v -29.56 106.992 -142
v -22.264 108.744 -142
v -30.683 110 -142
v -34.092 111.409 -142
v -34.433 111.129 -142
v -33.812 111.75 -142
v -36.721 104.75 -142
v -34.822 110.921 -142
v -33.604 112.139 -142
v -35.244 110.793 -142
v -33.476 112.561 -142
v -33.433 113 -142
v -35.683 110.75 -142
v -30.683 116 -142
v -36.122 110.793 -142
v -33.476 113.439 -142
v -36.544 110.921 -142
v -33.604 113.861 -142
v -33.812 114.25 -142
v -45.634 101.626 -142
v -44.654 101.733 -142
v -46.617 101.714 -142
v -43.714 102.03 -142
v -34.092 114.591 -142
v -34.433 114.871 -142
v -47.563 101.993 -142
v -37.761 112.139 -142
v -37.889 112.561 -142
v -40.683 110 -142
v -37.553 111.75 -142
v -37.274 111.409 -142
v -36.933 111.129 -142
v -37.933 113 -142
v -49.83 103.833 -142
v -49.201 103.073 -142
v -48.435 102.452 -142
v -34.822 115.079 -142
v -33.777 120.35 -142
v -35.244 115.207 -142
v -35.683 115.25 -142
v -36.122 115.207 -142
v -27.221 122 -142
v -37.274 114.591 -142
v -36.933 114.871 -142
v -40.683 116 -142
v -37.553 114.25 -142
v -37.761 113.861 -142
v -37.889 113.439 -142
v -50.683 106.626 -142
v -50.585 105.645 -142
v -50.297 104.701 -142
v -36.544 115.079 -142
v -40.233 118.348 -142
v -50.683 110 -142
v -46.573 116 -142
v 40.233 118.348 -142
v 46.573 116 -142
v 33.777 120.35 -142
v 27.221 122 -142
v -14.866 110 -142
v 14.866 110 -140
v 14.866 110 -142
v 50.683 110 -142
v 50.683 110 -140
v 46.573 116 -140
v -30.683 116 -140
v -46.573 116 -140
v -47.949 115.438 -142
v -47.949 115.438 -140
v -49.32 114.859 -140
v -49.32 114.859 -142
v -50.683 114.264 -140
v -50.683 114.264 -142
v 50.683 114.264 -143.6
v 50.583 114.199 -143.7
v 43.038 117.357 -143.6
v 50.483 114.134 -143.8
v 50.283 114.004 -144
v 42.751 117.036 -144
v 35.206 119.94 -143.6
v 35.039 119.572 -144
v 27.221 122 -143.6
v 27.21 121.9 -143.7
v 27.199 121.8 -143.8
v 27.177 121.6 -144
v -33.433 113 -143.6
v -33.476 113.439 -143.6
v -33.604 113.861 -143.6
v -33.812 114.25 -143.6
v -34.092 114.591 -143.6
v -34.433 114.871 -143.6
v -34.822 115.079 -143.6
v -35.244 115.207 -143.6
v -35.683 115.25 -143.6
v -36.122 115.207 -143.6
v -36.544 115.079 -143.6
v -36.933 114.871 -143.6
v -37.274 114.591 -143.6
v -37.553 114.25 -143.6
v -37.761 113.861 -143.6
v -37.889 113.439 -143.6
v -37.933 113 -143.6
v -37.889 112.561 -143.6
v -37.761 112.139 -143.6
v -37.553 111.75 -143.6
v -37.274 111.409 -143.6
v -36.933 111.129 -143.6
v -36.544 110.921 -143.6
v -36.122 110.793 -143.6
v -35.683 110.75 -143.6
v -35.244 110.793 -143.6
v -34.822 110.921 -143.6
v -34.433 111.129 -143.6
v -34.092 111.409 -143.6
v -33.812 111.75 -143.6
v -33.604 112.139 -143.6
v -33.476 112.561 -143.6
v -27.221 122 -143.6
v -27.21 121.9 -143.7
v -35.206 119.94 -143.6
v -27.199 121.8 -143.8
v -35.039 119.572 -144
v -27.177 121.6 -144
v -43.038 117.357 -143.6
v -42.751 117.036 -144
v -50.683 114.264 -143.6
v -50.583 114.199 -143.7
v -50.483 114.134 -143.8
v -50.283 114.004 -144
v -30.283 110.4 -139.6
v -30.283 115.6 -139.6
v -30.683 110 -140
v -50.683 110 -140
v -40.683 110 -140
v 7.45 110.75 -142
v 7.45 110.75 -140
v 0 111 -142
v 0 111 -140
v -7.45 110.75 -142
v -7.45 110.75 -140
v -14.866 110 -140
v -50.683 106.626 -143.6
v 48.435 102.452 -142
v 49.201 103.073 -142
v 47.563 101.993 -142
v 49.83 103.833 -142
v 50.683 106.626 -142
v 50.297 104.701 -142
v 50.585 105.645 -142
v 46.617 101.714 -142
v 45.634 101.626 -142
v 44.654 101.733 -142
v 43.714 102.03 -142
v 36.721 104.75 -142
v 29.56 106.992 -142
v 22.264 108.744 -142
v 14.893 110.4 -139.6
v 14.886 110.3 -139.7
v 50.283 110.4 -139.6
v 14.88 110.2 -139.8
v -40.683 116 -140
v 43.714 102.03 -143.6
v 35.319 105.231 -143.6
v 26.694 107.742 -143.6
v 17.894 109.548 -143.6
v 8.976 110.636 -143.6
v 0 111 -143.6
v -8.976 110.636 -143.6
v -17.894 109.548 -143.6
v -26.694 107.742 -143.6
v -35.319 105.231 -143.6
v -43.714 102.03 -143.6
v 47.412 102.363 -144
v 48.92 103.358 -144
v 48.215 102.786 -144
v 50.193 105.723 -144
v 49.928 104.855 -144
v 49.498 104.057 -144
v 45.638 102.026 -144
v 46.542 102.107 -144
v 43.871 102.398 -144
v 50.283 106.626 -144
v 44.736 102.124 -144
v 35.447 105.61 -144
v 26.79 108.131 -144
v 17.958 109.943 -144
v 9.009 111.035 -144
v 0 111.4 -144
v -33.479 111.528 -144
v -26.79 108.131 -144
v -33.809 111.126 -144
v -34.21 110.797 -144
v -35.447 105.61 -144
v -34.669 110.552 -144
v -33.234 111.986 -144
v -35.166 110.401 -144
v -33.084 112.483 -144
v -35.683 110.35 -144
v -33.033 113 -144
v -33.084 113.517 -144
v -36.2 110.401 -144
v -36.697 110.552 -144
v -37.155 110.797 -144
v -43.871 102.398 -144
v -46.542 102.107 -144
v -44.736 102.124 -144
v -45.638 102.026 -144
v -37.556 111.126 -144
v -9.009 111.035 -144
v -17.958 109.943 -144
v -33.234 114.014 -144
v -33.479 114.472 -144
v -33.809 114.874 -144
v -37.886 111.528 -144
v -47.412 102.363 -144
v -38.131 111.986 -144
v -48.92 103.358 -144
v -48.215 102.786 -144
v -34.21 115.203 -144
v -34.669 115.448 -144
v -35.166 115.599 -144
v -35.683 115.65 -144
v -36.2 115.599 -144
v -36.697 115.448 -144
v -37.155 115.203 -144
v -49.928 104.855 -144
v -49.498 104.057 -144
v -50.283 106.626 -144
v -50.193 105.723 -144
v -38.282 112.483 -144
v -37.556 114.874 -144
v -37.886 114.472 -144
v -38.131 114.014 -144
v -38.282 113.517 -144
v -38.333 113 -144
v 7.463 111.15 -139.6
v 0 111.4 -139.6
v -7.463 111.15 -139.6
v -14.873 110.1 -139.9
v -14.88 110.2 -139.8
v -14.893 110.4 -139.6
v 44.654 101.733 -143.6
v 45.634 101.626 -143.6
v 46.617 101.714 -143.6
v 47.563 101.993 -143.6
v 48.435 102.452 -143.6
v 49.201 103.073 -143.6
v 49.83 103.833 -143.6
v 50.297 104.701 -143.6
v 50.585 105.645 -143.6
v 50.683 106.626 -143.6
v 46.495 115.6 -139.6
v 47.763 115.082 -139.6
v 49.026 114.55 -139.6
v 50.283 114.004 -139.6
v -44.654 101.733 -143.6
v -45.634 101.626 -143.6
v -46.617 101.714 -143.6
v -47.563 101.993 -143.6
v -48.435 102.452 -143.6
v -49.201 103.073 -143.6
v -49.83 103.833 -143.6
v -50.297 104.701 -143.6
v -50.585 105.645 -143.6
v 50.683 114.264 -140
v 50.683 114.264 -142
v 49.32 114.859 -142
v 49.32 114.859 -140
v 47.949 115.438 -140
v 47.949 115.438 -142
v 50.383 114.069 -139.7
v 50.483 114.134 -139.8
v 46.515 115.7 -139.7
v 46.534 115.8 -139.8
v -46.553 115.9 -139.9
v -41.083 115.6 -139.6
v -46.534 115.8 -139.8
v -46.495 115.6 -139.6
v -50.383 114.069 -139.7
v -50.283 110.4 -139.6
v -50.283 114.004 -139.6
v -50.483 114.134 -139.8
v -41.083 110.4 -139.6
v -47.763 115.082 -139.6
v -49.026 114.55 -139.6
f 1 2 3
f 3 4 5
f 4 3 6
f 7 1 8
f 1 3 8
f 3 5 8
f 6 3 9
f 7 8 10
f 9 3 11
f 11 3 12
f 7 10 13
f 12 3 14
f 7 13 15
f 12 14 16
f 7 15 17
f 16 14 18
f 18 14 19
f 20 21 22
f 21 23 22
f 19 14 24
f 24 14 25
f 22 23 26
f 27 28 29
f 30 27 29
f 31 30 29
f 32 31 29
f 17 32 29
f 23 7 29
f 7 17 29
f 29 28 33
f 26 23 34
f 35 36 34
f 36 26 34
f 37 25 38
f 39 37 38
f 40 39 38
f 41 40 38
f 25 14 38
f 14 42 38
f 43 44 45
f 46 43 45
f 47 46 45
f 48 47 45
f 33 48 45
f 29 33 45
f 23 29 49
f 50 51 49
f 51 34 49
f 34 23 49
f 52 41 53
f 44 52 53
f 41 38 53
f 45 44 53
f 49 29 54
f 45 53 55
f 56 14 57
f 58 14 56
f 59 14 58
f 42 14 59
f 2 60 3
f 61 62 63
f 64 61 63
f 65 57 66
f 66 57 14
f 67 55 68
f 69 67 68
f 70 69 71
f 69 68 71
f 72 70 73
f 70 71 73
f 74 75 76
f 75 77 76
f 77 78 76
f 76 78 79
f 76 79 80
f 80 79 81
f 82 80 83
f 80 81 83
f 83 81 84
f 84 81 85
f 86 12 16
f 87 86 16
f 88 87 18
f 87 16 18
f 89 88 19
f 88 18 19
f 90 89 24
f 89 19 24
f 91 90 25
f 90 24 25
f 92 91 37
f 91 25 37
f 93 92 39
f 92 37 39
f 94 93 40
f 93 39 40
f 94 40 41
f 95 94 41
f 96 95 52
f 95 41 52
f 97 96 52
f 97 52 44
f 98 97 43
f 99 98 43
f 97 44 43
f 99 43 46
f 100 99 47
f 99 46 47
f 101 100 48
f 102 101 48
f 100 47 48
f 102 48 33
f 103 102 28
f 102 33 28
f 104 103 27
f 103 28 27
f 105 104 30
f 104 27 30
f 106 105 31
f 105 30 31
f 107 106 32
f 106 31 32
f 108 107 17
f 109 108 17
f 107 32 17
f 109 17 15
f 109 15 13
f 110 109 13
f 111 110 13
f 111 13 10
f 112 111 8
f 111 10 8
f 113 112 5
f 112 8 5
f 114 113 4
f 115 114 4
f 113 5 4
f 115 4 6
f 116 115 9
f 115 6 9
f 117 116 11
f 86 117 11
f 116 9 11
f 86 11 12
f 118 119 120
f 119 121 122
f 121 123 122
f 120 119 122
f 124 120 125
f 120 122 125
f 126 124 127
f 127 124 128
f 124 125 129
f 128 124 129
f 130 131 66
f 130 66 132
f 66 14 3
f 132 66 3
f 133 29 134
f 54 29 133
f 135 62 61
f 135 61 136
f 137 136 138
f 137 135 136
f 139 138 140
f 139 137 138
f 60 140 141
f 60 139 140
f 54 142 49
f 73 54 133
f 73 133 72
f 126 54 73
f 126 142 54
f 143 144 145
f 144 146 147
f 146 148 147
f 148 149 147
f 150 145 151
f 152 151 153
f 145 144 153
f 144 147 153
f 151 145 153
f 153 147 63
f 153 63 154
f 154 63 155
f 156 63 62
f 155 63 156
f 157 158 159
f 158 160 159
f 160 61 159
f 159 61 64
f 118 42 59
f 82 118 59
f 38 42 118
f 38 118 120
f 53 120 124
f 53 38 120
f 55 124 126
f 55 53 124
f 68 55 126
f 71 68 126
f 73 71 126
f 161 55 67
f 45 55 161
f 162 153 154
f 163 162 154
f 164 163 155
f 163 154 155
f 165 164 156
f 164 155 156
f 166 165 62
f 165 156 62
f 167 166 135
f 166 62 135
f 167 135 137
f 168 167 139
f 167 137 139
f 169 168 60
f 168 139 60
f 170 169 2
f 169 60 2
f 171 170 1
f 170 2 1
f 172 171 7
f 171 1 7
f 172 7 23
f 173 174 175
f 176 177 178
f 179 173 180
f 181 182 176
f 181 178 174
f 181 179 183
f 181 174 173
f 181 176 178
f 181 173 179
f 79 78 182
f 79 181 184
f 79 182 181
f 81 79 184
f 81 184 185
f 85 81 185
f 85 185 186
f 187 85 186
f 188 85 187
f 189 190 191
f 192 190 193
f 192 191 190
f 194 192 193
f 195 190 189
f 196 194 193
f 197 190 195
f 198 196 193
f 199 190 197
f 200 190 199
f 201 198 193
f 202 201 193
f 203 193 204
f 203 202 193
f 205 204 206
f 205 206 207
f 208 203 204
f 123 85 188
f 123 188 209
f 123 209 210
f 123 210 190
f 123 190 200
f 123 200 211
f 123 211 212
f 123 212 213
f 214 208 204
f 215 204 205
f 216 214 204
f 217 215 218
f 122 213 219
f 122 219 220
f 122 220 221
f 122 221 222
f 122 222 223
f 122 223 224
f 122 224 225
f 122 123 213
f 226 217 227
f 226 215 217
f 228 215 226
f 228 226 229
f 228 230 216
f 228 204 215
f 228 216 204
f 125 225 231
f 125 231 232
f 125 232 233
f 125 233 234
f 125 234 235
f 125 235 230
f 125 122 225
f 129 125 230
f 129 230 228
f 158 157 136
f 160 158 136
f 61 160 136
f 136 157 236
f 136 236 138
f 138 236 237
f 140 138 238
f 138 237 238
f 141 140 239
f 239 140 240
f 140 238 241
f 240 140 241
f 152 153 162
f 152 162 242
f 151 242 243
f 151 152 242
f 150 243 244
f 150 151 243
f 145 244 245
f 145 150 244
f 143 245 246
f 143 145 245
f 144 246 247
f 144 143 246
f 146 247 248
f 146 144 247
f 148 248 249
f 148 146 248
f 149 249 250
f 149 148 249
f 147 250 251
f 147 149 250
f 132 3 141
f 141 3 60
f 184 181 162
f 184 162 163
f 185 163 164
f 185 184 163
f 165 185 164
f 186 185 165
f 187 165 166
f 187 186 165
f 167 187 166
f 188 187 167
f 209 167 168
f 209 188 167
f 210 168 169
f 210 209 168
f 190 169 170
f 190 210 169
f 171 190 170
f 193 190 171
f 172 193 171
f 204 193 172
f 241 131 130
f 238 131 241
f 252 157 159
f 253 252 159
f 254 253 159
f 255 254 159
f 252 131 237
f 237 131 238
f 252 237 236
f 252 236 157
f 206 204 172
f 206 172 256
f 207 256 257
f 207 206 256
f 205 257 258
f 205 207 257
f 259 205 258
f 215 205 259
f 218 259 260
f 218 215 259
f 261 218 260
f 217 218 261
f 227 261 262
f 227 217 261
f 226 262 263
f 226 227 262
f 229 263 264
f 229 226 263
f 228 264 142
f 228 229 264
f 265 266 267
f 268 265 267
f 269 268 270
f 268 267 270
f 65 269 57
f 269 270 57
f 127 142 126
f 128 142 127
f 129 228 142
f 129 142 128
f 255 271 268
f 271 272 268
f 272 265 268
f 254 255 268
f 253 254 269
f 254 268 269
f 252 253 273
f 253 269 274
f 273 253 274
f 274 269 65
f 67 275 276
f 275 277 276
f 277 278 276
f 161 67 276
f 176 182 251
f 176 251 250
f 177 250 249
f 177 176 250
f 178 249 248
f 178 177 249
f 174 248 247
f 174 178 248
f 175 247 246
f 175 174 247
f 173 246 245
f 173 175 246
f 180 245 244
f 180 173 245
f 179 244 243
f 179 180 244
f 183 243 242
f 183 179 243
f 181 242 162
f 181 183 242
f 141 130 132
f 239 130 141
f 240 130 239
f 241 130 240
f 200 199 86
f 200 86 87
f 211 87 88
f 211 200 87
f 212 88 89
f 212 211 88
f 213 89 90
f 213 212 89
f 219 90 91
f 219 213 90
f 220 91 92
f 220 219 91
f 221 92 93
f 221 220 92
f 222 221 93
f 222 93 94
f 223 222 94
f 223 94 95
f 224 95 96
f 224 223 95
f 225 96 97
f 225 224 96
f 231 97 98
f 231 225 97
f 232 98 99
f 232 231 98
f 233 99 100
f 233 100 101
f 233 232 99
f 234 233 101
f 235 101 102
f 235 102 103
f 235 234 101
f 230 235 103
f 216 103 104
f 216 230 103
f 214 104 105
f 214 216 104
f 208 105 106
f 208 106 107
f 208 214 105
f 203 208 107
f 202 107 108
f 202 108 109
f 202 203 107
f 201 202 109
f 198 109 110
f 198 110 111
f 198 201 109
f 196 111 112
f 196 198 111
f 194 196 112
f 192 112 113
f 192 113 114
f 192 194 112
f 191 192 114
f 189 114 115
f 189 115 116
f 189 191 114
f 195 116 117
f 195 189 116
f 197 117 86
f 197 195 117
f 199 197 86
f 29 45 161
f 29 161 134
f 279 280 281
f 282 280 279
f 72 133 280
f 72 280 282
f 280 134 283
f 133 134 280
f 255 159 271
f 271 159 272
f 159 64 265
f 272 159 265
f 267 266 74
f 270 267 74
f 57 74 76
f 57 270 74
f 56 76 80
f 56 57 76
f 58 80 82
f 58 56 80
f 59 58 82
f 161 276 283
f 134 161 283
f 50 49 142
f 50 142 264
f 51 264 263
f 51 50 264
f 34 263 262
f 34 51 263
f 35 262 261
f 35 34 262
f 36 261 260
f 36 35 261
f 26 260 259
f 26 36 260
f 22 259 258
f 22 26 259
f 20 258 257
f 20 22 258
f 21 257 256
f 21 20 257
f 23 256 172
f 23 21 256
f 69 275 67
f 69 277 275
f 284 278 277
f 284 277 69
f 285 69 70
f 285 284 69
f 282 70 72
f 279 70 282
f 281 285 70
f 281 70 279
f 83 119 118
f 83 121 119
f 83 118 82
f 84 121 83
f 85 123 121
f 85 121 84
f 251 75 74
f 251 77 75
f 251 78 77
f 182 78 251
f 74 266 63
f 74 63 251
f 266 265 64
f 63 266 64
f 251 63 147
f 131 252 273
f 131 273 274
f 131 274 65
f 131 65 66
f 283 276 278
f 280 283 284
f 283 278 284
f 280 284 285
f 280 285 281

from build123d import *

# Parameters (mm, degrees)
SKETCH290_R     = 2.25
PAD_DEPTH       = 2
PAD074_DEPTH    = 2.4
CHAMFER005_SIZE = 0.4


with BuildPart() as part:
    # Sketch290 → Pad (new body)
    with BuildSketch(Plane.XY):
        with BuildLine():
            Line((-27.221315, 122), (27.221315, 122))
            ThreePointArc((50.682629, 114.264041), (39.143548, 118.713026), (27.221315, 122))
            Line((50.682629, 114.264041), (50.682629, 106.62597))
            ThreePointArc((43.71355, 102.030023), (48.435319, 102.451919), (50.682629, 106.62597))
            ThreePointArc((43.71355, 102.030023), (0, 111), (-43.71355, 102.030023))
            ThreePointArc((-50.682629, 106.62597), (-48.435319, 102.451919), (-43.71355, 102.030023))
            Line((-50.682629, 106.62597), (-50.682629, 114.264041))
            ThreePointArc((-27.221315, 122), (-39.143548, 118.713026), (-50.682629, 114.264041))
        make_face()
        with Locations((-35.682629, 113)):
            Circle(SKETCH290_R, mode=Mode.SUBTRACT)
    extrude(amount=-PAD_DEPTH)

    # Sketch291 → Pad074 (join)
    with BuildSketch(Plane.XY):
        with BuildLine():
            Line((-46.572524, 116), (-40.682629, 116))
            Line((-40.682629, 116), (-40.682629, 110))
            Line((-40.682629, 110), (-50.682629, 110))
            Line((-50.682629, 110), (-50.682629, 114.264041))
            ThreePointArc((-46.572524, 116), (-48.635322, 115.15036), (-50.682629, 114.264041))
        make_face()
        with BuildLine():
            Line((46.572524, 116), (-30.682629, 116))
            Line((-30.682629, 116), (-30.682629, 110))
            Line((-30.682629, 110), (-14.866069, 110))
            ThreePointArc((14.866069, 110), (0, 111), (-14.866069, 110))
            Line((14.866069, 110), (50.682629, 110))
            Line((50.682629, 110), (50.682629, 114.264041))
            ThreePointArc((50.682629, 114.264041), (48.635322, 115.15036), (46.572524, 116))
        make_face()
    extrude(amount=PAD074_DEPTH)

    # Chamfer005
    chamfer005_edges = [part.edges().sort_by_distance(p)[0] for p in [
        (-50.682629, 110.445006, -2),
        (-39.143548, 118.713026, -2),
        (0, 122, -2),
        (39.143548, 118.713026, -2),
        (50.682629, 110.445006, -2),
        (48.435319, 102.451919, -2),
        (0, 111, -2),
        (-48.435319, 102.451919, -2),
        (-37.932629, 113, -2),
        (32.774349, 110, 2.4),
        (50.682629, 112.132021, 2.4),
        (48.635322, 115.15036, 2.4),
        (7.944948, 116, 2.4),
        (-30.682629, 113, 2.4),
        (-22.774349, 110, 2.4),
        (0, 111, 2.4),
        (-43.627576, 116, 2.4),
        (-40.682629, 113, 2.4),
        (-45.682629, 110, 2.4),
        (-50.682629, 112.132021, 2.4),
        (-48.635322, 115.15036, 2.4),
    ]]
    chamfer(chamfer005_edges, length=CHAMFER005_SIZE)


with BuildPart() as part_1:
    # Body022061 placement: moved
    add(part.part.moved(Location((0, 0, -142))))


solid = part_1.part
